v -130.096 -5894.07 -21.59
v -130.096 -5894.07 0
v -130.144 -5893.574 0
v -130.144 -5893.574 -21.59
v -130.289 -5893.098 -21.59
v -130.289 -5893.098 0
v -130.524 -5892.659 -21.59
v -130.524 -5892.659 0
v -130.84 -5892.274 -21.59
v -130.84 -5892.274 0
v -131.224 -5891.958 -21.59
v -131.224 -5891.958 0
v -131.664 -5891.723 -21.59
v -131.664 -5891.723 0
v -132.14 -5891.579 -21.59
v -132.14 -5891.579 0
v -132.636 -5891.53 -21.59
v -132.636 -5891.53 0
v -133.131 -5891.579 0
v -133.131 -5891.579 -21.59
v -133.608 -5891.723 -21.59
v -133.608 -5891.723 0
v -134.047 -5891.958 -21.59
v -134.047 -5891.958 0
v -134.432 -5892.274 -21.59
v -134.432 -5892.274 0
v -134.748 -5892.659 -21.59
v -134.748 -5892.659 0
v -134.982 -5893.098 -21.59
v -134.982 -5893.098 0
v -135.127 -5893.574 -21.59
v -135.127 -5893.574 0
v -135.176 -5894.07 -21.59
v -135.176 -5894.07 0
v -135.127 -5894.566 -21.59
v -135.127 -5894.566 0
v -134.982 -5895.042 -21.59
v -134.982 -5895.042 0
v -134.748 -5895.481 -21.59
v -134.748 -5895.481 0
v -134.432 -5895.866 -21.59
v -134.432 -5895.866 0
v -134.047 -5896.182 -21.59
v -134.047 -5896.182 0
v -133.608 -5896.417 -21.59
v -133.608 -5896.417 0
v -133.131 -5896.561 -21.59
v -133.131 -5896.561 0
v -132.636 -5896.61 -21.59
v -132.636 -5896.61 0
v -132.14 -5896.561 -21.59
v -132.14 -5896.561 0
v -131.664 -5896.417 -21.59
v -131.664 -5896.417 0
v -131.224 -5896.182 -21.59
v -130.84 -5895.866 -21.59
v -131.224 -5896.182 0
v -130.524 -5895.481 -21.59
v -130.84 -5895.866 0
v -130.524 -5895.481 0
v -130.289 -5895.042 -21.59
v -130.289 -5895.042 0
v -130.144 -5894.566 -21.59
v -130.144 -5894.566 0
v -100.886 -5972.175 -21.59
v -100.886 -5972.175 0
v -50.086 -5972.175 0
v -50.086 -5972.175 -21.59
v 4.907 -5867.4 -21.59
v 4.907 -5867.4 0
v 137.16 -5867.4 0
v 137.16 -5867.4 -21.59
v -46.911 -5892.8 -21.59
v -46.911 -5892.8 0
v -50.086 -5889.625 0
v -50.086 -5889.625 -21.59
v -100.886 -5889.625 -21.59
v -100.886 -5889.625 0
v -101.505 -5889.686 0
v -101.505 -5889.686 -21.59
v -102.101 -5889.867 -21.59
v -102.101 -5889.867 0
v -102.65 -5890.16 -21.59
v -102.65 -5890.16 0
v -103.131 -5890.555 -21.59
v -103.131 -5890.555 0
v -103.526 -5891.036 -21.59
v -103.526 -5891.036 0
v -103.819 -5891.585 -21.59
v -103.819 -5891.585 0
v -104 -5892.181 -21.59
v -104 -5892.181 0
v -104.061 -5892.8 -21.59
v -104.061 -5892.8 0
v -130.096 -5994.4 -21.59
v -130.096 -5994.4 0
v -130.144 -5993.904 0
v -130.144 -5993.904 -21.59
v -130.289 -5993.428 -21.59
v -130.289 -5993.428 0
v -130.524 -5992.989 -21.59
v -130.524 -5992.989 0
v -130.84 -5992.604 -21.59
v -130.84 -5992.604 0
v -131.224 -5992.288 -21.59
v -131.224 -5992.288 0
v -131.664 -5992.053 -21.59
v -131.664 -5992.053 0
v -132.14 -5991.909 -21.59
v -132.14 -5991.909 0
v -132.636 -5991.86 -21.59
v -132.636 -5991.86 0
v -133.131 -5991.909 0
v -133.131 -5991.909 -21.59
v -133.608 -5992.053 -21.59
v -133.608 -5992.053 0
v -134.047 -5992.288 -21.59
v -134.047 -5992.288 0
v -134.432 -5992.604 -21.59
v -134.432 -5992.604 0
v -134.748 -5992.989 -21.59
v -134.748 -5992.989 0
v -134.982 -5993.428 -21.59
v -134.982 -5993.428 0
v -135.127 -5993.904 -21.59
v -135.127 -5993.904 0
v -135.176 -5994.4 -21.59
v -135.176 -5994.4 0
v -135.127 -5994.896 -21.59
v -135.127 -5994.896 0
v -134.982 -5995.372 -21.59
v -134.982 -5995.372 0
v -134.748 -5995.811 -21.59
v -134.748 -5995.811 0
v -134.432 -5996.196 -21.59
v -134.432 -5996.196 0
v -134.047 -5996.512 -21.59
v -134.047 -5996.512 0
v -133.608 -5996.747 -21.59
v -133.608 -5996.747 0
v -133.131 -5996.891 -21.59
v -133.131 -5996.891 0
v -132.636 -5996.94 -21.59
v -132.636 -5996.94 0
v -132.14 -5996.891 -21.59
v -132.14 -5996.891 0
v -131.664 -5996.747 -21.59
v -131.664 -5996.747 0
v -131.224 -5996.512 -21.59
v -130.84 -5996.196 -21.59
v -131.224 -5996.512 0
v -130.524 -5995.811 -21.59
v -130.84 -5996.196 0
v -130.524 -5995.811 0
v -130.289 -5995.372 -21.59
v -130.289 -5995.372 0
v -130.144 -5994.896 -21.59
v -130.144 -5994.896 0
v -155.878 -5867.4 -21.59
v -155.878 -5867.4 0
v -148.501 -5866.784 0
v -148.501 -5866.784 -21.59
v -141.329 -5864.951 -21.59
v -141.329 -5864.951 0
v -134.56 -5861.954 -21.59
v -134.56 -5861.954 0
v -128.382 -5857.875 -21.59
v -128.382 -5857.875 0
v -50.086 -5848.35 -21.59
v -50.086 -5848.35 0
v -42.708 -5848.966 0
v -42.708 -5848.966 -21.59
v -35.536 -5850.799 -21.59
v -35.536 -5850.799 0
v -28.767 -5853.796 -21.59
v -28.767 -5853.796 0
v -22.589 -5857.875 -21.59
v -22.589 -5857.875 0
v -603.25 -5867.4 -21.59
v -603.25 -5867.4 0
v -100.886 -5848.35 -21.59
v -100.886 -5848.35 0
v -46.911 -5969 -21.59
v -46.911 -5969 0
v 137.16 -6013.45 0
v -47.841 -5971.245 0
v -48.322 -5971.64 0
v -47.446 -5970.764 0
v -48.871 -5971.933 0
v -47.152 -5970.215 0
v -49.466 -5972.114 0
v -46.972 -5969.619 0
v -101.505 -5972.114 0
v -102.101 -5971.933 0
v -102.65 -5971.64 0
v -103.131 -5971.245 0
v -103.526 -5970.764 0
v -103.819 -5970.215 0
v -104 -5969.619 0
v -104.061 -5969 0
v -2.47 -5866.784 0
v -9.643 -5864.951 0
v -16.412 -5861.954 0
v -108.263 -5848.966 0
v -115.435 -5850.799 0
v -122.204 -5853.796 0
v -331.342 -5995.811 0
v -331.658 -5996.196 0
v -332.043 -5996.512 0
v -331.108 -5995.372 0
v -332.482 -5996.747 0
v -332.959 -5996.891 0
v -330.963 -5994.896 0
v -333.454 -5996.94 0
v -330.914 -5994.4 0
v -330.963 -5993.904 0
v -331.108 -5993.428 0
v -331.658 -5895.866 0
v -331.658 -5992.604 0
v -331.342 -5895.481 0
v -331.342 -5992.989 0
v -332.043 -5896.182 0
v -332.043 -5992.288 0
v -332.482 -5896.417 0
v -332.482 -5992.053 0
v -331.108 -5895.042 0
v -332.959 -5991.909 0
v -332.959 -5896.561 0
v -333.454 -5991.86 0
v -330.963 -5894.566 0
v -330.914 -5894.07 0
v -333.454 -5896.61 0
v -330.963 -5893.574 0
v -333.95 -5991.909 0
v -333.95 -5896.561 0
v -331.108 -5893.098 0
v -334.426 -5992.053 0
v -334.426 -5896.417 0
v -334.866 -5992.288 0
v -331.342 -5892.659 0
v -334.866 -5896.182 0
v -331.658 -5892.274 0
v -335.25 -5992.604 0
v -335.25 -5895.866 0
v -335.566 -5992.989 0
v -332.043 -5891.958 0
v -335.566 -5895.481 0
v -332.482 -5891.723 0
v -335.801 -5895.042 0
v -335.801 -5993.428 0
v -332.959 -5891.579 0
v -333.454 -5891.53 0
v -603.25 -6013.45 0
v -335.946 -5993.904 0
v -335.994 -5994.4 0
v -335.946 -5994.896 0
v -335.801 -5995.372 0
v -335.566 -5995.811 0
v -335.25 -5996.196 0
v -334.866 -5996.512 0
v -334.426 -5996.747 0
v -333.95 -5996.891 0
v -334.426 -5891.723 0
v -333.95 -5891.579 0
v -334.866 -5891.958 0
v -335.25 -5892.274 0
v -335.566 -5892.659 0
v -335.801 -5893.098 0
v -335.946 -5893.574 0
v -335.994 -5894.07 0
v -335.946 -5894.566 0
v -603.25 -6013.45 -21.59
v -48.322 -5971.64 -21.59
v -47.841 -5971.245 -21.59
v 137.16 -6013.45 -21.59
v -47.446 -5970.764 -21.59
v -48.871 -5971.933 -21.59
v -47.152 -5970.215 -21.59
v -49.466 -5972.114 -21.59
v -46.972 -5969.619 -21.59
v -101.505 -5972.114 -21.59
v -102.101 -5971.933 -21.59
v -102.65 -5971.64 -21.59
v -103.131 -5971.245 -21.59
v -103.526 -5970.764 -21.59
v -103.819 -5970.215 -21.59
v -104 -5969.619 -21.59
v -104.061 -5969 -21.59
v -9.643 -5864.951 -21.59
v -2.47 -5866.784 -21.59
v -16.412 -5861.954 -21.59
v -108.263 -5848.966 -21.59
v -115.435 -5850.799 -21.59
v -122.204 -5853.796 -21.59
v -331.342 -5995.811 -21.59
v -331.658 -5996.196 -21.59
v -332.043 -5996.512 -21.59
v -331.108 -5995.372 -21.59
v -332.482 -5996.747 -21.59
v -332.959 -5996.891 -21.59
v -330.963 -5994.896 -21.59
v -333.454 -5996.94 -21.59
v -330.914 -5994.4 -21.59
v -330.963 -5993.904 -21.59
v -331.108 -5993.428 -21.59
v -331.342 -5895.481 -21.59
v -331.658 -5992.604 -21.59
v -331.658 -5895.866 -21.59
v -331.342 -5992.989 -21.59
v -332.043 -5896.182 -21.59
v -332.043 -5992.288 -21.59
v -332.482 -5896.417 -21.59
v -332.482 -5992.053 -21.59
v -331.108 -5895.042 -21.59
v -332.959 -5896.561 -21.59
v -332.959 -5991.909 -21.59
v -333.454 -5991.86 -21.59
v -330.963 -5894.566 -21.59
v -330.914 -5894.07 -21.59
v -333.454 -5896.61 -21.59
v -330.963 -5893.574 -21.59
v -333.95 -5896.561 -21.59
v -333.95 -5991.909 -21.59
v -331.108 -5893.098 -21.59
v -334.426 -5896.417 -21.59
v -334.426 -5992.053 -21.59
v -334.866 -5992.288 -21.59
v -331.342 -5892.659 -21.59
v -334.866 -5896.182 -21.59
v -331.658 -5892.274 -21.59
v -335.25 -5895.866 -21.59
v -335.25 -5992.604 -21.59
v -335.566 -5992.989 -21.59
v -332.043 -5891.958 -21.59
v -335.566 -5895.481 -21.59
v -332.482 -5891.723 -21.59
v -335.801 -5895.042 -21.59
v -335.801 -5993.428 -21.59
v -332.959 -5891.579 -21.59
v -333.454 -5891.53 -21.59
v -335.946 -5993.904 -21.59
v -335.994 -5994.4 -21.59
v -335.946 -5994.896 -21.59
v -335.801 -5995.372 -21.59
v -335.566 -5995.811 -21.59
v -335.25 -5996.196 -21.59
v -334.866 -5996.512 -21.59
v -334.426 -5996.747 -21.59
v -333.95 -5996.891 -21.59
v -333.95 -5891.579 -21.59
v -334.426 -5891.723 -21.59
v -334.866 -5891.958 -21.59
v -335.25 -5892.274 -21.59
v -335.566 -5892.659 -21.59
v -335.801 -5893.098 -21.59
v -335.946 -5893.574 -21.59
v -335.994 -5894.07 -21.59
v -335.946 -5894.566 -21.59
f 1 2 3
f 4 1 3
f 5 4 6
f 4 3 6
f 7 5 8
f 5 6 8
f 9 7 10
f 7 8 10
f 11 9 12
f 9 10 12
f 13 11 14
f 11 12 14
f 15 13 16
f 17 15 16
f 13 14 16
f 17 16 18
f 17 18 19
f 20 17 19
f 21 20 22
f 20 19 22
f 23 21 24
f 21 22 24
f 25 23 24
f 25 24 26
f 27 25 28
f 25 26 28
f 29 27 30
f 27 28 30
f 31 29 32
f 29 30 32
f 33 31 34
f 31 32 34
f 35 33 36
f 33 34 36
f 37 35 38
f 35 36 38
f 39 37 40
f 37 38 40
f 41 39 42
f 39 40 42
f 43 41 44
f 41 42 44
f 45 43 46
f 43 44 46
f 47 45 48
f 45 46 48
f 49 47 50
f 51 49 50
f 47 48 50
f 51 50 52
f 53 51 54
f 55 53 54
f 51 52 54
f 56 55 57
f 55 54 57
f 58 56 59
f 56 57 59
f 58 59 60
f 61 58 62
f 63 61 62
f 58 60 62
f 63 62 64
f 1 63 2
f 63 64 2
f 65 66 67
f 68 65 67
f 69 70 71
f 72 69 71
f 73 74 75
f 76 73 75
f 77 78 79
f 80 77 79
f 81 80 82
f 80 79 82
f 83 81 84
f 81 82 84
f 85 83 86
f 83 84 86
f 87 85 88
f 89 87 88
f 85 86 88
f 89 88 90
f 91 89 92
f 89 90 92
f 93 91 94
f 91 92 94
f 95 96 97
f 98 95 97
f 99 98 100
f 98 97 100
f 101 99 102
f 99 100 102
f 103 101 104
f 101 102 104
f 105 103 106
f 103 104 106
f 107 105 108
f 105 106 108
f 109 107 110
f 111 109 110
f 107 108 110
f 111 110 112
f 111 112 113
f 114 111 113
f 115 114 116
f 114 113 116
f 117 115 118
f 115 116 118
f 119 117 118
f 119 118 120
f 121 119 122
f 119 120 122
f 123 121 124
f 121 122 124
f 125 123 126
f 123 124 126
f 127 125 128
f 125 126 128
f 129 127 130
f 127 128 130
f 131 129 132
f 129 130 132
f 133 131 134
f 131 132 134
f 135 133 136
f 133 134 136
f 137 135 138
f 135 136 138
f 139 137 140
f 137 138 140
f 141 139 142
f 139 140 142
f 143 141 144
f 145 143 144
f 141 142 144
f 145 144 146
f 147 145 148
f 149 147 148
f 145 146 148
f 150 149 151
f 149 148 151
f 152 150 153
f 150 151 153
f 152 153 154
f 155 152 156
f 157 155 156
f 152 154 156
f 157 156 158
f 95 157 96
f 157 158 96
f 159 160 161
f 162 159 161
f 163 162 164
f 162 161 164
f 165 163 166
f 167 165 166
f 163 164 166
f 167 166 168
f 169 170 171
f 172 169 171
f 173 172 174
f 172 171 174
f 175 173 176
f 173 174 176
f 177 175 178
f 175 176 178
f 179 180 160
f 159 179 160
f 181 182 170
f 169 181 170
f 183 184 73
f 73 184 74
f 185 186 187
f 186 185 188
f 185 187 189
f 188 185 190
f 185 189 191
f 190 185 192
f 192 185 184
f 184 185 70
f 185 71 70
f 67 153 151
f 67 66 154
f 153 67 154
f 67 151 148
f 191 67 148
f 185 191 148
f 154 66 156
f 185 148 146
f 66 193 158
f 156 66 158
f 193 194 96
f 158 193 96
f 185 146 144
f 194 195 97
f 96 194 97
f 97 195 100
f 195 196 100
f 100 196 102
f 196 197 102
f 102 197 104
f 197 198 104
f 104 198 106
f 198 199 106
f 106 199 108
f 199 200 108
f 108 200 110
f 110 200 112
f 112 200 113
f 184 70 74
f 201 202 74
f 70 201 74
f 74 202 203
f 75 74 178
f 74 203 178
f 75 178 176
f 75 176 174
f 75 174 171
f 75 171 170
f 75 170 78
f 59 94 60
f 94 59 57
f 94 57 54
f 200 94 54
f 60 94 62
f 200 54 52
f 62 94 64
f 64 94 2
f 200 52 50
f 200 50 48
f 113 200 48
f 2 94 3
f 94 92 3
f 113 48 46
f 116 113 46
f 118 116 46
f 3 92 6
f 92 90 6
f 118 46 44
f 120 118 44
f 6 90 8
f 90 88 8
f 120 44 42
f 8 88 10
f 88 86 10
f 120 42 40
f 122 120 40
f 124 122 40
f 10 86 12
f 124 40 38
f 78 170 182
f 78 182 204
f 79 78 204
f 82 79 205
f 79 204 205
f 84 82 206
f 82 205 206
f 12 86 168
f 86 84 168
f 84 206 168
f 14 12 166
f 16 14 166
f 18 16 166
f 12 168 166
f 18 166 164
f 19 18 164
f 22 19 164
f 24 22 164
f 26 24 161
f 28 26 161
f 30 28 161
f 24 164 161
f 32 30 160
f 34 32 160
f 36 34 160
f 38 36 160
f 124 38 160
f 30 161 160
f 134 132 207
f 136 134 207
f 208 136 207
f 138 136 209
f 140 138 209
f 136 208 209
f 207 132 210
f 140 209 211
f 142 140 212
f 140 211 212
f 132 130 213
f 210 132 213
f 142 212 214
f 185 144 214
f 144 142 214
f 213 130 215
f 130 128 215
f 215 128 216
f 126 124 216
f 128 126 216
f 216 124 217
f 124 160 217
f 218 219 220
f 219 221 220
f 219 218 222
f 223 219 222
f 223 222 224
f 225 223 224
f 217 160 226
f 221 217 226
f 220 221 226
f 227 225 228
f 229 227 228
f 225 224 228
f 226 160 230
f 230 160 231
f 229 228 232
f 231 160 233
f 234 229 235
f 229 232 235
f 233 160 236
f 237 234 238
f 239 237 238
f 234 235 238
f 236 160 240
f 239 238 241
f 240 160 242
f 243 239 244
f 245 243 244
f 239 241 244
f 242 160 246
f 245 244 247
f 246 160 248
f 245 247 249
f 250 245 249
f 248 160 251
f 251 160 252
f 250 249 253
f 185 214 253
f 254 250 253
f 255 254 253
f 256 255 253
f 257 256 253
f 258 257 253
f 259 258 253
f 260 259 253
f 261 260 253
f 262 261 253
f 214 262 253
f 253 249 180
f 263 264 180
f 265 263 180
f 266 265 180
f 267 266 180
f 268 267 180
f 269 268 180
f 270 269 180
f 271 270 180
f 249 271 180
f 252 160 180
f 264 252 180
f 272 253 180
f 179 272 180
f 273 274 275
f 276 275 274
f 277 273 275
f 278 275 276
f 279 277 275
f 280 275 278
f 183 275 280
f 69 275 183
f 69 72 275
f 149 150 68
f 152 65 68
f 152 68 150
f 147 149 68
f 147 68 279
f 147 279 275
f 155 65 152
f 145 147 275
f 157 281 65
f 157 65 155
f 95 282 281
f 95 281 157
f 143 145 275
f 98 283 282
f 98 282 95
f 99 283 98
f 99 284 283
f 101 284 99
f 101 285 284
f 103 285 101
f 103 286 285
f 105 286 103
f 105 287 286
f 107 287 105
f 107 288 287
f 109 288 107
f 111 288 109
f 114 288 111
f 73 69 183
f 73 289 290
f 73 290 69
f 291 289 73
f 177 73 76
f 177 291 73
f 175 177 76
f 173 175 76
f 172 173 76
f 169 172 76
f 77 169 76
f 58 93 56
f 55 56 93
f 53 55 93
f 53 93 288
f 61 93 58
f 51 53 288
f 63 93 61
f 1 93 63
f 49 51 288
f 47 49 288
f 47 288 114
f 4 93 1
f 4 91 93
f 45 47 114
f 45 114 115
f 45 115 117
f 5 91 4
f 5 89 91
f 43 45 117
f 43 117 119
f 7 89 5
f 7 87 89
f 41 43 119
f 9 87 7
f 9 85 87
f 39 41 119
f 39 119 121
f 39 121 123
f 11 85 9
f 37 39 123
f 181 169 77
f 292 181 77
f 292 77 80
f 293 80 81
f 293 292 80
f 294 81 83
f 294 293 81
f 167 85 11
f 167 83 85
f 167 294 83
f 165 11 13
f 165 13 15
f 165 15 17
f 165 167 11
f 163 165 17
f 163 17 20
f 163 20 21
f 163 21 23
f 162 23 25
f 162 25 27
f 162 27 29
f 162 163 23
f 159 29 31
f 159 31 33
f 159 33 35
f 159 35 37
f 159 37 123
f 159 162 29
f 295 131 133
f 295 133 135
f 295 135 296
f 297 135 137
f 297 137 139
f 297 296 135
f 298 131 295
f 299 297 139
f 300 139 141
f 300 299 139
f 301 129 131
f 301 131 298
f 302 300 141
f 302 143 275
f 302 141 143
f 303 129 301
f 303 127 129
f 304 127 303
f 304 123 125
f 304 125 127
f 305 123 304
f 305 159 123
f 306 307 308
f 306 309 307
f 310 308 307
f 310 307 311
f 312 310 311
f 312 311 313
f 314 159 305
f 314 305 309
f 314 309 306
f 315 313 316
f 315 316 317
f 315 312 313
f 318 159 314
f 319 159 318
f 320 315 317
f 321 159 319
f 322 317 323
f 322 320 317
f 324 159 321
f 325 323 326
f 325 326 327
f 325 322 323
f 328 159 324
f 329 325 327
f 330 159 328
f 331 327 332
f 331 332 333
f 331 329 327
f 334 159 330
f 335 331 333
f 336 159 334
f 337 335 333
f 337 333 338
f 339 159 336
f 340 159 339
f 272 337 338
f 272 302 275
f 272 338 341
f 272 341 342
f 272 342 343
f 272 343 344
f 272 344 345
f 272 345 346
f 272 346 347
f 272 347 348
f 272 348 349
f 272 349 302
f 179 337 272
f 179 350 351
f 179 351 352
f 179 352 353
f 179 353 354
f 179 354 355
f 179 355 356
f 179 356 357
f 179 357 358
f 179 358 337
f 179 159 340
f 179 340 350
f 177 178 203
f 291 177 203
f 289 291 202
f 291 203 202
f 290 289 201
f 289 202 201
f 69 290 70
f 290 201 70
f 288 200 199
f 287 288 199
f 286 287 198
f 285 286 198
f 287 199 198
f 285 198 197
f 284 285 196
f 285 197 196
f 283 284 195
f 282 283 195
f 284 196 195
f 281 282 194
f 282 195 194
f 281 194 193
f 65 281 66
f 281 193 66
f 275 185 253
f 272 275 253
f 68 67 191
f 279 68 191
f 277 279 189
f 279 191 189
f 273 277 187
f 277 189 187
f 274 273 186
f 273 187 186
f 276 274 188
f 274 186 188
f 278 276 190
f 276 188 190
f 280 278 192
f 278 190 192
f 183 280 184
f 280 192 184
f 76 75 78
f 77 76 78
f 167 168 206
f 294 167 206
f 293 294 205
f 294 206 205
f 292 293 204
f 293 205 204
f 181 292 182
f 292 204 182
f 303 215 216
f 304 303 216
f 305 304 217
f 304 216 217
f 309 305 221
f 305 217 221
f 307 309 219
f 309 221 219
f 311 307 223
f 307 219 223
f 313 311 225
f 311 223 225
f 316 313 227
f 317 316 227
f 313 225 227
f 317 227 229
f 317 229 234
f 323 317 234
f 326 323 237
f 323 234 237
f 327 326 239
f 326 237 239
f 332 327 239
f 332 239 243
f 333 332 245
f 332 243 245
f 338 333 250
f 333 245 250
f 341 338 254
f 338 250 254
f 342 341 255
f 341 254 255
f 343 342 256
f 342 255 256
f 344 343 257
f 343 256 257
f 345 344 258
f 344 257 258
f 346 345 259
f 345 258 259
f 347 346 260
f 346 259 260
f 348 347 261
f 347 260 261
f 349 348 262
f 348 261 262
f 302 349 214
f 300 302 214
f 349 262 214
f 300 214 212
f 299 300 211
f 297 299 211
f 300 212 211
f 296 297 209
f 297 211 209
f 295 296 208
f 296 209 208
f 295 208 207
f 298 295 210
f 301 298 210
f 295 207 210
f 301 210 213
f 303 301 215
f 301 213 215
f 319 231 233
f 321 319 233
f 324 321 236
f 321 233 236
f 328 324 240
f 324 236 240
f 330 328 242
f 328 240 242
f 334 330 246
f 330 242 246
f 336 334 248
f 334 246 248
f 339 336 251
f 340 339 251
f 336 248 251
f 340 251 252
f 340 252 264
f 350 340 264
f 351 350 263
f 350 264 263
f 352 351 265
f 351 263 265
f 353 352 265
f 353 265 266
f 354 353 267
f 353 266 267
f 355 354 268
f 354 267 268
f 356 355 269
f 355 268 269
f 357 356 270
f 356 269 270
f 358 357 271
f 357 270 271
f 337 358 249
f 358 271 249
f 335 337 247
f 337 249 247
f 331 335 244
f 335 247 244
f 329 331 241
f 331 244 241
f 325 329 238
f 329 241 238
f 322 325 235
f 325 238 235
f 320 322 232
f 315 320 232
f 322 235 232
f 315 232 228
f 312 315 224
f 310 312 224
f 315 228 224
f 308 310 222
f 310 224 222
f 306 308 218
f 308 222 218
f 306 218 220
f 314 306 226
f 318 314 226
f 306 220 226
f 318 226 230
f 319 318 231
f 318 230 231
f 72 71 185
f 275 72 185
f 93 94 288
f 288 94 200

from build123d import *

# Parameters (mm, degrees)
EXTRUDE1_DEPTH     = 21.59
SKETCH3_R          = 2.54
CUT_EXTRUDE1_DEPTH = 21.59


with BuildPart() as part:
    # Sketch2 → Extrude1 (new body)
    with BuildSketch(Plane.XY):
        with BuildLine():
            Line((137.16, -6013.450000001), (-603.25, -6013.450000001))
            Line((-603.25, -6013.450000001), (-603.25, -5867.400000001))
            Line((-603.25, -5867.400000001), (-155.878238141, -5867.400000001))
            ThreePointArc((-155.878238141, -5867.400000001), (-141.328560309, -5864.951302064), (-128.38193157, -5857.875))
            ThreePointArc((-128.38193157, -5857.875), (-115.435302831, -5850.798697937), (-100.885625, -5848.35))
            Line((-100.885625, -5848.35), (-50.085625, -5848.35))
            ThreePointArc((-50.085625, -5848.35), (-35.535947169, -5850.798697937), (-22.58931843, -5857.875))
            ThreePointArc((-22.58931843, -5857.875), (-9.642689691, -5864.951302063), (4.906988141, -5867.400000001))
            Line((4.906988141, -5867.400000001), (137.16, -5867.400000001))
            Line((137.16, -5867.400000001), (137.16, -6013.450000001))
        make_face()
    extrude(amount=-EXTRUDE1_DEPTH)

    # Sketch3 → Cut-Extrude1 (cut)
    with BuildSketch(Plane.XY):
        with Locations((-333.454375, -5994.4)):
            Circle(SKETCH3_R)
        with Locations((-132.635625, -5994.4)):
            Circle(SKETCH3_R)
        with Locations((-132.635625, -5894.07)):
            Circle(SKETCH3_R)
        with Locations((-333.454375, -5894.07)):
            Circle(SKETCH3_R)
        with BuildLine():
            Line((-104.060625, -5892.8), (-104.060625, -5969))
            ThreePointArc((-104.060625, -5969), (-103.13068903, -5971.24506403), (-100.885625, -5972.175))
            Line((-100.885625, -5972.175), (-50.085625, -5972.175))
            ThreePointArc((-50.085625, -5972.175), (-47.84056097, -5971.24506403), (-46.910625, -5969))
            Line((-46.910625, -5969), (-46.910625, -5892.8))
            Line((-46.910625, -5892.8), (-50.085625, -5889.625))
            Line((-50.085625, -5889.625), (-100.885625, -5889.625))
            ThreePointArc((-100.885625, -5889.625), (-103.13068903, -5890.55493597), (-104.060625, -5892.8))
        make_face()
    extrude(amount=-CUT_EXTRUDE1_DEPTH, mode=Mode.SUBTRACT)


solid = part.part
